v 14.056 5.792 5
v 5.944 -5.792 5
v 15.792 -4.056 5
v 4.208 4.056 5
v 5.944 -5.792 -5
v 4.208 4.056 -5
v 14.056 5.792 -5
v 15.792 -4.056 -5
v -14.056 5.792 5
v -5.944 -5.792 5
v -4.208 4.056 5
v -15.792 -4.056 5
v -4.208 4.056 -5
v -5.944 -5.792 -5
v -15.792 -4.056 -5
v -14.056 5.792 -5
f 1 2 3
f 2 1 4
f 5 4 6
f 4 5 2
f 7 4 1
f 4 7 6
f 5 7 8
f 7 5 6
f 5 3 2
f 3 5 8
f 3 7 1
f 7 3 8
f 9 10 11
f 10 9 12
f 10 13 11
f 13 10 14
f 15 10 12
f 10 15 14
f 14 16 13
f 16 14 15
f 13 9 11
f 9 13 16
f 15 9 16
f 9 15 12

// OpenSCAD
// file: basic_shapes.scad
//
// Licensed under the MIT license. See LICENSE file in the project root for details.
//

module plate(length=0, width=0, thickness=0, l=0, w=0, t=0){
    length_ =    (l>0)? l : length;
    width_ =     (w>0)? w : width;
    thickness_ = (t>0)? t : thickness;
    
    translate([0, 0, thickness_/2]) cube(size=[length_, width_, thickness_], center=true);
}

module rounded_plate(length=0, width=0, thickness=0, radius=0, l=0, w=0, t=0, r=0){
    length_ =    (l>0)? l : length;
    width_ =     (w>0)? w : width;
    thickness_ = (t>0)? t : thickness;
    radius_ =    (r>0)? r : radius;
    
    l1 = length_-2*radius_;
    l2 = width_-2*radius_;
    
    hull(){
        plate(length=l1, width=l2, thickness=thickness_);
        translate([-l1/2, -l2/2, 0]) cylinder(r=radius_, h=thickness_);
        translate([ l1/2, -l2/2, 0]) cylinder(r=radius_, h=thickness_);
        translate([ l1/2,  l2/2, 0]) cylinder(r=radius_, h=thickness_);
        translate([-l1/2,  l2/2, 0]) cylinder(r=radius_, h=thickness_);
    }
}
// file: operations.scad
//
// Licensed under the MIT license. See LICENSE file in the project root for details.
//


// Custom operations

module mirror_copy(L)
{
    children();
    mirror(L) children();
}


// Demo

mirror_copy([1, 0, 0]) translate([10, 0, 0]) rotate([0, 0, 10]) cube(10, center=true);
// main file
//
// Licensed under the MIT license. See LICENSE file in the project root for details.
//

include <operations.scad>;
include <basic_shapes.scad>;
